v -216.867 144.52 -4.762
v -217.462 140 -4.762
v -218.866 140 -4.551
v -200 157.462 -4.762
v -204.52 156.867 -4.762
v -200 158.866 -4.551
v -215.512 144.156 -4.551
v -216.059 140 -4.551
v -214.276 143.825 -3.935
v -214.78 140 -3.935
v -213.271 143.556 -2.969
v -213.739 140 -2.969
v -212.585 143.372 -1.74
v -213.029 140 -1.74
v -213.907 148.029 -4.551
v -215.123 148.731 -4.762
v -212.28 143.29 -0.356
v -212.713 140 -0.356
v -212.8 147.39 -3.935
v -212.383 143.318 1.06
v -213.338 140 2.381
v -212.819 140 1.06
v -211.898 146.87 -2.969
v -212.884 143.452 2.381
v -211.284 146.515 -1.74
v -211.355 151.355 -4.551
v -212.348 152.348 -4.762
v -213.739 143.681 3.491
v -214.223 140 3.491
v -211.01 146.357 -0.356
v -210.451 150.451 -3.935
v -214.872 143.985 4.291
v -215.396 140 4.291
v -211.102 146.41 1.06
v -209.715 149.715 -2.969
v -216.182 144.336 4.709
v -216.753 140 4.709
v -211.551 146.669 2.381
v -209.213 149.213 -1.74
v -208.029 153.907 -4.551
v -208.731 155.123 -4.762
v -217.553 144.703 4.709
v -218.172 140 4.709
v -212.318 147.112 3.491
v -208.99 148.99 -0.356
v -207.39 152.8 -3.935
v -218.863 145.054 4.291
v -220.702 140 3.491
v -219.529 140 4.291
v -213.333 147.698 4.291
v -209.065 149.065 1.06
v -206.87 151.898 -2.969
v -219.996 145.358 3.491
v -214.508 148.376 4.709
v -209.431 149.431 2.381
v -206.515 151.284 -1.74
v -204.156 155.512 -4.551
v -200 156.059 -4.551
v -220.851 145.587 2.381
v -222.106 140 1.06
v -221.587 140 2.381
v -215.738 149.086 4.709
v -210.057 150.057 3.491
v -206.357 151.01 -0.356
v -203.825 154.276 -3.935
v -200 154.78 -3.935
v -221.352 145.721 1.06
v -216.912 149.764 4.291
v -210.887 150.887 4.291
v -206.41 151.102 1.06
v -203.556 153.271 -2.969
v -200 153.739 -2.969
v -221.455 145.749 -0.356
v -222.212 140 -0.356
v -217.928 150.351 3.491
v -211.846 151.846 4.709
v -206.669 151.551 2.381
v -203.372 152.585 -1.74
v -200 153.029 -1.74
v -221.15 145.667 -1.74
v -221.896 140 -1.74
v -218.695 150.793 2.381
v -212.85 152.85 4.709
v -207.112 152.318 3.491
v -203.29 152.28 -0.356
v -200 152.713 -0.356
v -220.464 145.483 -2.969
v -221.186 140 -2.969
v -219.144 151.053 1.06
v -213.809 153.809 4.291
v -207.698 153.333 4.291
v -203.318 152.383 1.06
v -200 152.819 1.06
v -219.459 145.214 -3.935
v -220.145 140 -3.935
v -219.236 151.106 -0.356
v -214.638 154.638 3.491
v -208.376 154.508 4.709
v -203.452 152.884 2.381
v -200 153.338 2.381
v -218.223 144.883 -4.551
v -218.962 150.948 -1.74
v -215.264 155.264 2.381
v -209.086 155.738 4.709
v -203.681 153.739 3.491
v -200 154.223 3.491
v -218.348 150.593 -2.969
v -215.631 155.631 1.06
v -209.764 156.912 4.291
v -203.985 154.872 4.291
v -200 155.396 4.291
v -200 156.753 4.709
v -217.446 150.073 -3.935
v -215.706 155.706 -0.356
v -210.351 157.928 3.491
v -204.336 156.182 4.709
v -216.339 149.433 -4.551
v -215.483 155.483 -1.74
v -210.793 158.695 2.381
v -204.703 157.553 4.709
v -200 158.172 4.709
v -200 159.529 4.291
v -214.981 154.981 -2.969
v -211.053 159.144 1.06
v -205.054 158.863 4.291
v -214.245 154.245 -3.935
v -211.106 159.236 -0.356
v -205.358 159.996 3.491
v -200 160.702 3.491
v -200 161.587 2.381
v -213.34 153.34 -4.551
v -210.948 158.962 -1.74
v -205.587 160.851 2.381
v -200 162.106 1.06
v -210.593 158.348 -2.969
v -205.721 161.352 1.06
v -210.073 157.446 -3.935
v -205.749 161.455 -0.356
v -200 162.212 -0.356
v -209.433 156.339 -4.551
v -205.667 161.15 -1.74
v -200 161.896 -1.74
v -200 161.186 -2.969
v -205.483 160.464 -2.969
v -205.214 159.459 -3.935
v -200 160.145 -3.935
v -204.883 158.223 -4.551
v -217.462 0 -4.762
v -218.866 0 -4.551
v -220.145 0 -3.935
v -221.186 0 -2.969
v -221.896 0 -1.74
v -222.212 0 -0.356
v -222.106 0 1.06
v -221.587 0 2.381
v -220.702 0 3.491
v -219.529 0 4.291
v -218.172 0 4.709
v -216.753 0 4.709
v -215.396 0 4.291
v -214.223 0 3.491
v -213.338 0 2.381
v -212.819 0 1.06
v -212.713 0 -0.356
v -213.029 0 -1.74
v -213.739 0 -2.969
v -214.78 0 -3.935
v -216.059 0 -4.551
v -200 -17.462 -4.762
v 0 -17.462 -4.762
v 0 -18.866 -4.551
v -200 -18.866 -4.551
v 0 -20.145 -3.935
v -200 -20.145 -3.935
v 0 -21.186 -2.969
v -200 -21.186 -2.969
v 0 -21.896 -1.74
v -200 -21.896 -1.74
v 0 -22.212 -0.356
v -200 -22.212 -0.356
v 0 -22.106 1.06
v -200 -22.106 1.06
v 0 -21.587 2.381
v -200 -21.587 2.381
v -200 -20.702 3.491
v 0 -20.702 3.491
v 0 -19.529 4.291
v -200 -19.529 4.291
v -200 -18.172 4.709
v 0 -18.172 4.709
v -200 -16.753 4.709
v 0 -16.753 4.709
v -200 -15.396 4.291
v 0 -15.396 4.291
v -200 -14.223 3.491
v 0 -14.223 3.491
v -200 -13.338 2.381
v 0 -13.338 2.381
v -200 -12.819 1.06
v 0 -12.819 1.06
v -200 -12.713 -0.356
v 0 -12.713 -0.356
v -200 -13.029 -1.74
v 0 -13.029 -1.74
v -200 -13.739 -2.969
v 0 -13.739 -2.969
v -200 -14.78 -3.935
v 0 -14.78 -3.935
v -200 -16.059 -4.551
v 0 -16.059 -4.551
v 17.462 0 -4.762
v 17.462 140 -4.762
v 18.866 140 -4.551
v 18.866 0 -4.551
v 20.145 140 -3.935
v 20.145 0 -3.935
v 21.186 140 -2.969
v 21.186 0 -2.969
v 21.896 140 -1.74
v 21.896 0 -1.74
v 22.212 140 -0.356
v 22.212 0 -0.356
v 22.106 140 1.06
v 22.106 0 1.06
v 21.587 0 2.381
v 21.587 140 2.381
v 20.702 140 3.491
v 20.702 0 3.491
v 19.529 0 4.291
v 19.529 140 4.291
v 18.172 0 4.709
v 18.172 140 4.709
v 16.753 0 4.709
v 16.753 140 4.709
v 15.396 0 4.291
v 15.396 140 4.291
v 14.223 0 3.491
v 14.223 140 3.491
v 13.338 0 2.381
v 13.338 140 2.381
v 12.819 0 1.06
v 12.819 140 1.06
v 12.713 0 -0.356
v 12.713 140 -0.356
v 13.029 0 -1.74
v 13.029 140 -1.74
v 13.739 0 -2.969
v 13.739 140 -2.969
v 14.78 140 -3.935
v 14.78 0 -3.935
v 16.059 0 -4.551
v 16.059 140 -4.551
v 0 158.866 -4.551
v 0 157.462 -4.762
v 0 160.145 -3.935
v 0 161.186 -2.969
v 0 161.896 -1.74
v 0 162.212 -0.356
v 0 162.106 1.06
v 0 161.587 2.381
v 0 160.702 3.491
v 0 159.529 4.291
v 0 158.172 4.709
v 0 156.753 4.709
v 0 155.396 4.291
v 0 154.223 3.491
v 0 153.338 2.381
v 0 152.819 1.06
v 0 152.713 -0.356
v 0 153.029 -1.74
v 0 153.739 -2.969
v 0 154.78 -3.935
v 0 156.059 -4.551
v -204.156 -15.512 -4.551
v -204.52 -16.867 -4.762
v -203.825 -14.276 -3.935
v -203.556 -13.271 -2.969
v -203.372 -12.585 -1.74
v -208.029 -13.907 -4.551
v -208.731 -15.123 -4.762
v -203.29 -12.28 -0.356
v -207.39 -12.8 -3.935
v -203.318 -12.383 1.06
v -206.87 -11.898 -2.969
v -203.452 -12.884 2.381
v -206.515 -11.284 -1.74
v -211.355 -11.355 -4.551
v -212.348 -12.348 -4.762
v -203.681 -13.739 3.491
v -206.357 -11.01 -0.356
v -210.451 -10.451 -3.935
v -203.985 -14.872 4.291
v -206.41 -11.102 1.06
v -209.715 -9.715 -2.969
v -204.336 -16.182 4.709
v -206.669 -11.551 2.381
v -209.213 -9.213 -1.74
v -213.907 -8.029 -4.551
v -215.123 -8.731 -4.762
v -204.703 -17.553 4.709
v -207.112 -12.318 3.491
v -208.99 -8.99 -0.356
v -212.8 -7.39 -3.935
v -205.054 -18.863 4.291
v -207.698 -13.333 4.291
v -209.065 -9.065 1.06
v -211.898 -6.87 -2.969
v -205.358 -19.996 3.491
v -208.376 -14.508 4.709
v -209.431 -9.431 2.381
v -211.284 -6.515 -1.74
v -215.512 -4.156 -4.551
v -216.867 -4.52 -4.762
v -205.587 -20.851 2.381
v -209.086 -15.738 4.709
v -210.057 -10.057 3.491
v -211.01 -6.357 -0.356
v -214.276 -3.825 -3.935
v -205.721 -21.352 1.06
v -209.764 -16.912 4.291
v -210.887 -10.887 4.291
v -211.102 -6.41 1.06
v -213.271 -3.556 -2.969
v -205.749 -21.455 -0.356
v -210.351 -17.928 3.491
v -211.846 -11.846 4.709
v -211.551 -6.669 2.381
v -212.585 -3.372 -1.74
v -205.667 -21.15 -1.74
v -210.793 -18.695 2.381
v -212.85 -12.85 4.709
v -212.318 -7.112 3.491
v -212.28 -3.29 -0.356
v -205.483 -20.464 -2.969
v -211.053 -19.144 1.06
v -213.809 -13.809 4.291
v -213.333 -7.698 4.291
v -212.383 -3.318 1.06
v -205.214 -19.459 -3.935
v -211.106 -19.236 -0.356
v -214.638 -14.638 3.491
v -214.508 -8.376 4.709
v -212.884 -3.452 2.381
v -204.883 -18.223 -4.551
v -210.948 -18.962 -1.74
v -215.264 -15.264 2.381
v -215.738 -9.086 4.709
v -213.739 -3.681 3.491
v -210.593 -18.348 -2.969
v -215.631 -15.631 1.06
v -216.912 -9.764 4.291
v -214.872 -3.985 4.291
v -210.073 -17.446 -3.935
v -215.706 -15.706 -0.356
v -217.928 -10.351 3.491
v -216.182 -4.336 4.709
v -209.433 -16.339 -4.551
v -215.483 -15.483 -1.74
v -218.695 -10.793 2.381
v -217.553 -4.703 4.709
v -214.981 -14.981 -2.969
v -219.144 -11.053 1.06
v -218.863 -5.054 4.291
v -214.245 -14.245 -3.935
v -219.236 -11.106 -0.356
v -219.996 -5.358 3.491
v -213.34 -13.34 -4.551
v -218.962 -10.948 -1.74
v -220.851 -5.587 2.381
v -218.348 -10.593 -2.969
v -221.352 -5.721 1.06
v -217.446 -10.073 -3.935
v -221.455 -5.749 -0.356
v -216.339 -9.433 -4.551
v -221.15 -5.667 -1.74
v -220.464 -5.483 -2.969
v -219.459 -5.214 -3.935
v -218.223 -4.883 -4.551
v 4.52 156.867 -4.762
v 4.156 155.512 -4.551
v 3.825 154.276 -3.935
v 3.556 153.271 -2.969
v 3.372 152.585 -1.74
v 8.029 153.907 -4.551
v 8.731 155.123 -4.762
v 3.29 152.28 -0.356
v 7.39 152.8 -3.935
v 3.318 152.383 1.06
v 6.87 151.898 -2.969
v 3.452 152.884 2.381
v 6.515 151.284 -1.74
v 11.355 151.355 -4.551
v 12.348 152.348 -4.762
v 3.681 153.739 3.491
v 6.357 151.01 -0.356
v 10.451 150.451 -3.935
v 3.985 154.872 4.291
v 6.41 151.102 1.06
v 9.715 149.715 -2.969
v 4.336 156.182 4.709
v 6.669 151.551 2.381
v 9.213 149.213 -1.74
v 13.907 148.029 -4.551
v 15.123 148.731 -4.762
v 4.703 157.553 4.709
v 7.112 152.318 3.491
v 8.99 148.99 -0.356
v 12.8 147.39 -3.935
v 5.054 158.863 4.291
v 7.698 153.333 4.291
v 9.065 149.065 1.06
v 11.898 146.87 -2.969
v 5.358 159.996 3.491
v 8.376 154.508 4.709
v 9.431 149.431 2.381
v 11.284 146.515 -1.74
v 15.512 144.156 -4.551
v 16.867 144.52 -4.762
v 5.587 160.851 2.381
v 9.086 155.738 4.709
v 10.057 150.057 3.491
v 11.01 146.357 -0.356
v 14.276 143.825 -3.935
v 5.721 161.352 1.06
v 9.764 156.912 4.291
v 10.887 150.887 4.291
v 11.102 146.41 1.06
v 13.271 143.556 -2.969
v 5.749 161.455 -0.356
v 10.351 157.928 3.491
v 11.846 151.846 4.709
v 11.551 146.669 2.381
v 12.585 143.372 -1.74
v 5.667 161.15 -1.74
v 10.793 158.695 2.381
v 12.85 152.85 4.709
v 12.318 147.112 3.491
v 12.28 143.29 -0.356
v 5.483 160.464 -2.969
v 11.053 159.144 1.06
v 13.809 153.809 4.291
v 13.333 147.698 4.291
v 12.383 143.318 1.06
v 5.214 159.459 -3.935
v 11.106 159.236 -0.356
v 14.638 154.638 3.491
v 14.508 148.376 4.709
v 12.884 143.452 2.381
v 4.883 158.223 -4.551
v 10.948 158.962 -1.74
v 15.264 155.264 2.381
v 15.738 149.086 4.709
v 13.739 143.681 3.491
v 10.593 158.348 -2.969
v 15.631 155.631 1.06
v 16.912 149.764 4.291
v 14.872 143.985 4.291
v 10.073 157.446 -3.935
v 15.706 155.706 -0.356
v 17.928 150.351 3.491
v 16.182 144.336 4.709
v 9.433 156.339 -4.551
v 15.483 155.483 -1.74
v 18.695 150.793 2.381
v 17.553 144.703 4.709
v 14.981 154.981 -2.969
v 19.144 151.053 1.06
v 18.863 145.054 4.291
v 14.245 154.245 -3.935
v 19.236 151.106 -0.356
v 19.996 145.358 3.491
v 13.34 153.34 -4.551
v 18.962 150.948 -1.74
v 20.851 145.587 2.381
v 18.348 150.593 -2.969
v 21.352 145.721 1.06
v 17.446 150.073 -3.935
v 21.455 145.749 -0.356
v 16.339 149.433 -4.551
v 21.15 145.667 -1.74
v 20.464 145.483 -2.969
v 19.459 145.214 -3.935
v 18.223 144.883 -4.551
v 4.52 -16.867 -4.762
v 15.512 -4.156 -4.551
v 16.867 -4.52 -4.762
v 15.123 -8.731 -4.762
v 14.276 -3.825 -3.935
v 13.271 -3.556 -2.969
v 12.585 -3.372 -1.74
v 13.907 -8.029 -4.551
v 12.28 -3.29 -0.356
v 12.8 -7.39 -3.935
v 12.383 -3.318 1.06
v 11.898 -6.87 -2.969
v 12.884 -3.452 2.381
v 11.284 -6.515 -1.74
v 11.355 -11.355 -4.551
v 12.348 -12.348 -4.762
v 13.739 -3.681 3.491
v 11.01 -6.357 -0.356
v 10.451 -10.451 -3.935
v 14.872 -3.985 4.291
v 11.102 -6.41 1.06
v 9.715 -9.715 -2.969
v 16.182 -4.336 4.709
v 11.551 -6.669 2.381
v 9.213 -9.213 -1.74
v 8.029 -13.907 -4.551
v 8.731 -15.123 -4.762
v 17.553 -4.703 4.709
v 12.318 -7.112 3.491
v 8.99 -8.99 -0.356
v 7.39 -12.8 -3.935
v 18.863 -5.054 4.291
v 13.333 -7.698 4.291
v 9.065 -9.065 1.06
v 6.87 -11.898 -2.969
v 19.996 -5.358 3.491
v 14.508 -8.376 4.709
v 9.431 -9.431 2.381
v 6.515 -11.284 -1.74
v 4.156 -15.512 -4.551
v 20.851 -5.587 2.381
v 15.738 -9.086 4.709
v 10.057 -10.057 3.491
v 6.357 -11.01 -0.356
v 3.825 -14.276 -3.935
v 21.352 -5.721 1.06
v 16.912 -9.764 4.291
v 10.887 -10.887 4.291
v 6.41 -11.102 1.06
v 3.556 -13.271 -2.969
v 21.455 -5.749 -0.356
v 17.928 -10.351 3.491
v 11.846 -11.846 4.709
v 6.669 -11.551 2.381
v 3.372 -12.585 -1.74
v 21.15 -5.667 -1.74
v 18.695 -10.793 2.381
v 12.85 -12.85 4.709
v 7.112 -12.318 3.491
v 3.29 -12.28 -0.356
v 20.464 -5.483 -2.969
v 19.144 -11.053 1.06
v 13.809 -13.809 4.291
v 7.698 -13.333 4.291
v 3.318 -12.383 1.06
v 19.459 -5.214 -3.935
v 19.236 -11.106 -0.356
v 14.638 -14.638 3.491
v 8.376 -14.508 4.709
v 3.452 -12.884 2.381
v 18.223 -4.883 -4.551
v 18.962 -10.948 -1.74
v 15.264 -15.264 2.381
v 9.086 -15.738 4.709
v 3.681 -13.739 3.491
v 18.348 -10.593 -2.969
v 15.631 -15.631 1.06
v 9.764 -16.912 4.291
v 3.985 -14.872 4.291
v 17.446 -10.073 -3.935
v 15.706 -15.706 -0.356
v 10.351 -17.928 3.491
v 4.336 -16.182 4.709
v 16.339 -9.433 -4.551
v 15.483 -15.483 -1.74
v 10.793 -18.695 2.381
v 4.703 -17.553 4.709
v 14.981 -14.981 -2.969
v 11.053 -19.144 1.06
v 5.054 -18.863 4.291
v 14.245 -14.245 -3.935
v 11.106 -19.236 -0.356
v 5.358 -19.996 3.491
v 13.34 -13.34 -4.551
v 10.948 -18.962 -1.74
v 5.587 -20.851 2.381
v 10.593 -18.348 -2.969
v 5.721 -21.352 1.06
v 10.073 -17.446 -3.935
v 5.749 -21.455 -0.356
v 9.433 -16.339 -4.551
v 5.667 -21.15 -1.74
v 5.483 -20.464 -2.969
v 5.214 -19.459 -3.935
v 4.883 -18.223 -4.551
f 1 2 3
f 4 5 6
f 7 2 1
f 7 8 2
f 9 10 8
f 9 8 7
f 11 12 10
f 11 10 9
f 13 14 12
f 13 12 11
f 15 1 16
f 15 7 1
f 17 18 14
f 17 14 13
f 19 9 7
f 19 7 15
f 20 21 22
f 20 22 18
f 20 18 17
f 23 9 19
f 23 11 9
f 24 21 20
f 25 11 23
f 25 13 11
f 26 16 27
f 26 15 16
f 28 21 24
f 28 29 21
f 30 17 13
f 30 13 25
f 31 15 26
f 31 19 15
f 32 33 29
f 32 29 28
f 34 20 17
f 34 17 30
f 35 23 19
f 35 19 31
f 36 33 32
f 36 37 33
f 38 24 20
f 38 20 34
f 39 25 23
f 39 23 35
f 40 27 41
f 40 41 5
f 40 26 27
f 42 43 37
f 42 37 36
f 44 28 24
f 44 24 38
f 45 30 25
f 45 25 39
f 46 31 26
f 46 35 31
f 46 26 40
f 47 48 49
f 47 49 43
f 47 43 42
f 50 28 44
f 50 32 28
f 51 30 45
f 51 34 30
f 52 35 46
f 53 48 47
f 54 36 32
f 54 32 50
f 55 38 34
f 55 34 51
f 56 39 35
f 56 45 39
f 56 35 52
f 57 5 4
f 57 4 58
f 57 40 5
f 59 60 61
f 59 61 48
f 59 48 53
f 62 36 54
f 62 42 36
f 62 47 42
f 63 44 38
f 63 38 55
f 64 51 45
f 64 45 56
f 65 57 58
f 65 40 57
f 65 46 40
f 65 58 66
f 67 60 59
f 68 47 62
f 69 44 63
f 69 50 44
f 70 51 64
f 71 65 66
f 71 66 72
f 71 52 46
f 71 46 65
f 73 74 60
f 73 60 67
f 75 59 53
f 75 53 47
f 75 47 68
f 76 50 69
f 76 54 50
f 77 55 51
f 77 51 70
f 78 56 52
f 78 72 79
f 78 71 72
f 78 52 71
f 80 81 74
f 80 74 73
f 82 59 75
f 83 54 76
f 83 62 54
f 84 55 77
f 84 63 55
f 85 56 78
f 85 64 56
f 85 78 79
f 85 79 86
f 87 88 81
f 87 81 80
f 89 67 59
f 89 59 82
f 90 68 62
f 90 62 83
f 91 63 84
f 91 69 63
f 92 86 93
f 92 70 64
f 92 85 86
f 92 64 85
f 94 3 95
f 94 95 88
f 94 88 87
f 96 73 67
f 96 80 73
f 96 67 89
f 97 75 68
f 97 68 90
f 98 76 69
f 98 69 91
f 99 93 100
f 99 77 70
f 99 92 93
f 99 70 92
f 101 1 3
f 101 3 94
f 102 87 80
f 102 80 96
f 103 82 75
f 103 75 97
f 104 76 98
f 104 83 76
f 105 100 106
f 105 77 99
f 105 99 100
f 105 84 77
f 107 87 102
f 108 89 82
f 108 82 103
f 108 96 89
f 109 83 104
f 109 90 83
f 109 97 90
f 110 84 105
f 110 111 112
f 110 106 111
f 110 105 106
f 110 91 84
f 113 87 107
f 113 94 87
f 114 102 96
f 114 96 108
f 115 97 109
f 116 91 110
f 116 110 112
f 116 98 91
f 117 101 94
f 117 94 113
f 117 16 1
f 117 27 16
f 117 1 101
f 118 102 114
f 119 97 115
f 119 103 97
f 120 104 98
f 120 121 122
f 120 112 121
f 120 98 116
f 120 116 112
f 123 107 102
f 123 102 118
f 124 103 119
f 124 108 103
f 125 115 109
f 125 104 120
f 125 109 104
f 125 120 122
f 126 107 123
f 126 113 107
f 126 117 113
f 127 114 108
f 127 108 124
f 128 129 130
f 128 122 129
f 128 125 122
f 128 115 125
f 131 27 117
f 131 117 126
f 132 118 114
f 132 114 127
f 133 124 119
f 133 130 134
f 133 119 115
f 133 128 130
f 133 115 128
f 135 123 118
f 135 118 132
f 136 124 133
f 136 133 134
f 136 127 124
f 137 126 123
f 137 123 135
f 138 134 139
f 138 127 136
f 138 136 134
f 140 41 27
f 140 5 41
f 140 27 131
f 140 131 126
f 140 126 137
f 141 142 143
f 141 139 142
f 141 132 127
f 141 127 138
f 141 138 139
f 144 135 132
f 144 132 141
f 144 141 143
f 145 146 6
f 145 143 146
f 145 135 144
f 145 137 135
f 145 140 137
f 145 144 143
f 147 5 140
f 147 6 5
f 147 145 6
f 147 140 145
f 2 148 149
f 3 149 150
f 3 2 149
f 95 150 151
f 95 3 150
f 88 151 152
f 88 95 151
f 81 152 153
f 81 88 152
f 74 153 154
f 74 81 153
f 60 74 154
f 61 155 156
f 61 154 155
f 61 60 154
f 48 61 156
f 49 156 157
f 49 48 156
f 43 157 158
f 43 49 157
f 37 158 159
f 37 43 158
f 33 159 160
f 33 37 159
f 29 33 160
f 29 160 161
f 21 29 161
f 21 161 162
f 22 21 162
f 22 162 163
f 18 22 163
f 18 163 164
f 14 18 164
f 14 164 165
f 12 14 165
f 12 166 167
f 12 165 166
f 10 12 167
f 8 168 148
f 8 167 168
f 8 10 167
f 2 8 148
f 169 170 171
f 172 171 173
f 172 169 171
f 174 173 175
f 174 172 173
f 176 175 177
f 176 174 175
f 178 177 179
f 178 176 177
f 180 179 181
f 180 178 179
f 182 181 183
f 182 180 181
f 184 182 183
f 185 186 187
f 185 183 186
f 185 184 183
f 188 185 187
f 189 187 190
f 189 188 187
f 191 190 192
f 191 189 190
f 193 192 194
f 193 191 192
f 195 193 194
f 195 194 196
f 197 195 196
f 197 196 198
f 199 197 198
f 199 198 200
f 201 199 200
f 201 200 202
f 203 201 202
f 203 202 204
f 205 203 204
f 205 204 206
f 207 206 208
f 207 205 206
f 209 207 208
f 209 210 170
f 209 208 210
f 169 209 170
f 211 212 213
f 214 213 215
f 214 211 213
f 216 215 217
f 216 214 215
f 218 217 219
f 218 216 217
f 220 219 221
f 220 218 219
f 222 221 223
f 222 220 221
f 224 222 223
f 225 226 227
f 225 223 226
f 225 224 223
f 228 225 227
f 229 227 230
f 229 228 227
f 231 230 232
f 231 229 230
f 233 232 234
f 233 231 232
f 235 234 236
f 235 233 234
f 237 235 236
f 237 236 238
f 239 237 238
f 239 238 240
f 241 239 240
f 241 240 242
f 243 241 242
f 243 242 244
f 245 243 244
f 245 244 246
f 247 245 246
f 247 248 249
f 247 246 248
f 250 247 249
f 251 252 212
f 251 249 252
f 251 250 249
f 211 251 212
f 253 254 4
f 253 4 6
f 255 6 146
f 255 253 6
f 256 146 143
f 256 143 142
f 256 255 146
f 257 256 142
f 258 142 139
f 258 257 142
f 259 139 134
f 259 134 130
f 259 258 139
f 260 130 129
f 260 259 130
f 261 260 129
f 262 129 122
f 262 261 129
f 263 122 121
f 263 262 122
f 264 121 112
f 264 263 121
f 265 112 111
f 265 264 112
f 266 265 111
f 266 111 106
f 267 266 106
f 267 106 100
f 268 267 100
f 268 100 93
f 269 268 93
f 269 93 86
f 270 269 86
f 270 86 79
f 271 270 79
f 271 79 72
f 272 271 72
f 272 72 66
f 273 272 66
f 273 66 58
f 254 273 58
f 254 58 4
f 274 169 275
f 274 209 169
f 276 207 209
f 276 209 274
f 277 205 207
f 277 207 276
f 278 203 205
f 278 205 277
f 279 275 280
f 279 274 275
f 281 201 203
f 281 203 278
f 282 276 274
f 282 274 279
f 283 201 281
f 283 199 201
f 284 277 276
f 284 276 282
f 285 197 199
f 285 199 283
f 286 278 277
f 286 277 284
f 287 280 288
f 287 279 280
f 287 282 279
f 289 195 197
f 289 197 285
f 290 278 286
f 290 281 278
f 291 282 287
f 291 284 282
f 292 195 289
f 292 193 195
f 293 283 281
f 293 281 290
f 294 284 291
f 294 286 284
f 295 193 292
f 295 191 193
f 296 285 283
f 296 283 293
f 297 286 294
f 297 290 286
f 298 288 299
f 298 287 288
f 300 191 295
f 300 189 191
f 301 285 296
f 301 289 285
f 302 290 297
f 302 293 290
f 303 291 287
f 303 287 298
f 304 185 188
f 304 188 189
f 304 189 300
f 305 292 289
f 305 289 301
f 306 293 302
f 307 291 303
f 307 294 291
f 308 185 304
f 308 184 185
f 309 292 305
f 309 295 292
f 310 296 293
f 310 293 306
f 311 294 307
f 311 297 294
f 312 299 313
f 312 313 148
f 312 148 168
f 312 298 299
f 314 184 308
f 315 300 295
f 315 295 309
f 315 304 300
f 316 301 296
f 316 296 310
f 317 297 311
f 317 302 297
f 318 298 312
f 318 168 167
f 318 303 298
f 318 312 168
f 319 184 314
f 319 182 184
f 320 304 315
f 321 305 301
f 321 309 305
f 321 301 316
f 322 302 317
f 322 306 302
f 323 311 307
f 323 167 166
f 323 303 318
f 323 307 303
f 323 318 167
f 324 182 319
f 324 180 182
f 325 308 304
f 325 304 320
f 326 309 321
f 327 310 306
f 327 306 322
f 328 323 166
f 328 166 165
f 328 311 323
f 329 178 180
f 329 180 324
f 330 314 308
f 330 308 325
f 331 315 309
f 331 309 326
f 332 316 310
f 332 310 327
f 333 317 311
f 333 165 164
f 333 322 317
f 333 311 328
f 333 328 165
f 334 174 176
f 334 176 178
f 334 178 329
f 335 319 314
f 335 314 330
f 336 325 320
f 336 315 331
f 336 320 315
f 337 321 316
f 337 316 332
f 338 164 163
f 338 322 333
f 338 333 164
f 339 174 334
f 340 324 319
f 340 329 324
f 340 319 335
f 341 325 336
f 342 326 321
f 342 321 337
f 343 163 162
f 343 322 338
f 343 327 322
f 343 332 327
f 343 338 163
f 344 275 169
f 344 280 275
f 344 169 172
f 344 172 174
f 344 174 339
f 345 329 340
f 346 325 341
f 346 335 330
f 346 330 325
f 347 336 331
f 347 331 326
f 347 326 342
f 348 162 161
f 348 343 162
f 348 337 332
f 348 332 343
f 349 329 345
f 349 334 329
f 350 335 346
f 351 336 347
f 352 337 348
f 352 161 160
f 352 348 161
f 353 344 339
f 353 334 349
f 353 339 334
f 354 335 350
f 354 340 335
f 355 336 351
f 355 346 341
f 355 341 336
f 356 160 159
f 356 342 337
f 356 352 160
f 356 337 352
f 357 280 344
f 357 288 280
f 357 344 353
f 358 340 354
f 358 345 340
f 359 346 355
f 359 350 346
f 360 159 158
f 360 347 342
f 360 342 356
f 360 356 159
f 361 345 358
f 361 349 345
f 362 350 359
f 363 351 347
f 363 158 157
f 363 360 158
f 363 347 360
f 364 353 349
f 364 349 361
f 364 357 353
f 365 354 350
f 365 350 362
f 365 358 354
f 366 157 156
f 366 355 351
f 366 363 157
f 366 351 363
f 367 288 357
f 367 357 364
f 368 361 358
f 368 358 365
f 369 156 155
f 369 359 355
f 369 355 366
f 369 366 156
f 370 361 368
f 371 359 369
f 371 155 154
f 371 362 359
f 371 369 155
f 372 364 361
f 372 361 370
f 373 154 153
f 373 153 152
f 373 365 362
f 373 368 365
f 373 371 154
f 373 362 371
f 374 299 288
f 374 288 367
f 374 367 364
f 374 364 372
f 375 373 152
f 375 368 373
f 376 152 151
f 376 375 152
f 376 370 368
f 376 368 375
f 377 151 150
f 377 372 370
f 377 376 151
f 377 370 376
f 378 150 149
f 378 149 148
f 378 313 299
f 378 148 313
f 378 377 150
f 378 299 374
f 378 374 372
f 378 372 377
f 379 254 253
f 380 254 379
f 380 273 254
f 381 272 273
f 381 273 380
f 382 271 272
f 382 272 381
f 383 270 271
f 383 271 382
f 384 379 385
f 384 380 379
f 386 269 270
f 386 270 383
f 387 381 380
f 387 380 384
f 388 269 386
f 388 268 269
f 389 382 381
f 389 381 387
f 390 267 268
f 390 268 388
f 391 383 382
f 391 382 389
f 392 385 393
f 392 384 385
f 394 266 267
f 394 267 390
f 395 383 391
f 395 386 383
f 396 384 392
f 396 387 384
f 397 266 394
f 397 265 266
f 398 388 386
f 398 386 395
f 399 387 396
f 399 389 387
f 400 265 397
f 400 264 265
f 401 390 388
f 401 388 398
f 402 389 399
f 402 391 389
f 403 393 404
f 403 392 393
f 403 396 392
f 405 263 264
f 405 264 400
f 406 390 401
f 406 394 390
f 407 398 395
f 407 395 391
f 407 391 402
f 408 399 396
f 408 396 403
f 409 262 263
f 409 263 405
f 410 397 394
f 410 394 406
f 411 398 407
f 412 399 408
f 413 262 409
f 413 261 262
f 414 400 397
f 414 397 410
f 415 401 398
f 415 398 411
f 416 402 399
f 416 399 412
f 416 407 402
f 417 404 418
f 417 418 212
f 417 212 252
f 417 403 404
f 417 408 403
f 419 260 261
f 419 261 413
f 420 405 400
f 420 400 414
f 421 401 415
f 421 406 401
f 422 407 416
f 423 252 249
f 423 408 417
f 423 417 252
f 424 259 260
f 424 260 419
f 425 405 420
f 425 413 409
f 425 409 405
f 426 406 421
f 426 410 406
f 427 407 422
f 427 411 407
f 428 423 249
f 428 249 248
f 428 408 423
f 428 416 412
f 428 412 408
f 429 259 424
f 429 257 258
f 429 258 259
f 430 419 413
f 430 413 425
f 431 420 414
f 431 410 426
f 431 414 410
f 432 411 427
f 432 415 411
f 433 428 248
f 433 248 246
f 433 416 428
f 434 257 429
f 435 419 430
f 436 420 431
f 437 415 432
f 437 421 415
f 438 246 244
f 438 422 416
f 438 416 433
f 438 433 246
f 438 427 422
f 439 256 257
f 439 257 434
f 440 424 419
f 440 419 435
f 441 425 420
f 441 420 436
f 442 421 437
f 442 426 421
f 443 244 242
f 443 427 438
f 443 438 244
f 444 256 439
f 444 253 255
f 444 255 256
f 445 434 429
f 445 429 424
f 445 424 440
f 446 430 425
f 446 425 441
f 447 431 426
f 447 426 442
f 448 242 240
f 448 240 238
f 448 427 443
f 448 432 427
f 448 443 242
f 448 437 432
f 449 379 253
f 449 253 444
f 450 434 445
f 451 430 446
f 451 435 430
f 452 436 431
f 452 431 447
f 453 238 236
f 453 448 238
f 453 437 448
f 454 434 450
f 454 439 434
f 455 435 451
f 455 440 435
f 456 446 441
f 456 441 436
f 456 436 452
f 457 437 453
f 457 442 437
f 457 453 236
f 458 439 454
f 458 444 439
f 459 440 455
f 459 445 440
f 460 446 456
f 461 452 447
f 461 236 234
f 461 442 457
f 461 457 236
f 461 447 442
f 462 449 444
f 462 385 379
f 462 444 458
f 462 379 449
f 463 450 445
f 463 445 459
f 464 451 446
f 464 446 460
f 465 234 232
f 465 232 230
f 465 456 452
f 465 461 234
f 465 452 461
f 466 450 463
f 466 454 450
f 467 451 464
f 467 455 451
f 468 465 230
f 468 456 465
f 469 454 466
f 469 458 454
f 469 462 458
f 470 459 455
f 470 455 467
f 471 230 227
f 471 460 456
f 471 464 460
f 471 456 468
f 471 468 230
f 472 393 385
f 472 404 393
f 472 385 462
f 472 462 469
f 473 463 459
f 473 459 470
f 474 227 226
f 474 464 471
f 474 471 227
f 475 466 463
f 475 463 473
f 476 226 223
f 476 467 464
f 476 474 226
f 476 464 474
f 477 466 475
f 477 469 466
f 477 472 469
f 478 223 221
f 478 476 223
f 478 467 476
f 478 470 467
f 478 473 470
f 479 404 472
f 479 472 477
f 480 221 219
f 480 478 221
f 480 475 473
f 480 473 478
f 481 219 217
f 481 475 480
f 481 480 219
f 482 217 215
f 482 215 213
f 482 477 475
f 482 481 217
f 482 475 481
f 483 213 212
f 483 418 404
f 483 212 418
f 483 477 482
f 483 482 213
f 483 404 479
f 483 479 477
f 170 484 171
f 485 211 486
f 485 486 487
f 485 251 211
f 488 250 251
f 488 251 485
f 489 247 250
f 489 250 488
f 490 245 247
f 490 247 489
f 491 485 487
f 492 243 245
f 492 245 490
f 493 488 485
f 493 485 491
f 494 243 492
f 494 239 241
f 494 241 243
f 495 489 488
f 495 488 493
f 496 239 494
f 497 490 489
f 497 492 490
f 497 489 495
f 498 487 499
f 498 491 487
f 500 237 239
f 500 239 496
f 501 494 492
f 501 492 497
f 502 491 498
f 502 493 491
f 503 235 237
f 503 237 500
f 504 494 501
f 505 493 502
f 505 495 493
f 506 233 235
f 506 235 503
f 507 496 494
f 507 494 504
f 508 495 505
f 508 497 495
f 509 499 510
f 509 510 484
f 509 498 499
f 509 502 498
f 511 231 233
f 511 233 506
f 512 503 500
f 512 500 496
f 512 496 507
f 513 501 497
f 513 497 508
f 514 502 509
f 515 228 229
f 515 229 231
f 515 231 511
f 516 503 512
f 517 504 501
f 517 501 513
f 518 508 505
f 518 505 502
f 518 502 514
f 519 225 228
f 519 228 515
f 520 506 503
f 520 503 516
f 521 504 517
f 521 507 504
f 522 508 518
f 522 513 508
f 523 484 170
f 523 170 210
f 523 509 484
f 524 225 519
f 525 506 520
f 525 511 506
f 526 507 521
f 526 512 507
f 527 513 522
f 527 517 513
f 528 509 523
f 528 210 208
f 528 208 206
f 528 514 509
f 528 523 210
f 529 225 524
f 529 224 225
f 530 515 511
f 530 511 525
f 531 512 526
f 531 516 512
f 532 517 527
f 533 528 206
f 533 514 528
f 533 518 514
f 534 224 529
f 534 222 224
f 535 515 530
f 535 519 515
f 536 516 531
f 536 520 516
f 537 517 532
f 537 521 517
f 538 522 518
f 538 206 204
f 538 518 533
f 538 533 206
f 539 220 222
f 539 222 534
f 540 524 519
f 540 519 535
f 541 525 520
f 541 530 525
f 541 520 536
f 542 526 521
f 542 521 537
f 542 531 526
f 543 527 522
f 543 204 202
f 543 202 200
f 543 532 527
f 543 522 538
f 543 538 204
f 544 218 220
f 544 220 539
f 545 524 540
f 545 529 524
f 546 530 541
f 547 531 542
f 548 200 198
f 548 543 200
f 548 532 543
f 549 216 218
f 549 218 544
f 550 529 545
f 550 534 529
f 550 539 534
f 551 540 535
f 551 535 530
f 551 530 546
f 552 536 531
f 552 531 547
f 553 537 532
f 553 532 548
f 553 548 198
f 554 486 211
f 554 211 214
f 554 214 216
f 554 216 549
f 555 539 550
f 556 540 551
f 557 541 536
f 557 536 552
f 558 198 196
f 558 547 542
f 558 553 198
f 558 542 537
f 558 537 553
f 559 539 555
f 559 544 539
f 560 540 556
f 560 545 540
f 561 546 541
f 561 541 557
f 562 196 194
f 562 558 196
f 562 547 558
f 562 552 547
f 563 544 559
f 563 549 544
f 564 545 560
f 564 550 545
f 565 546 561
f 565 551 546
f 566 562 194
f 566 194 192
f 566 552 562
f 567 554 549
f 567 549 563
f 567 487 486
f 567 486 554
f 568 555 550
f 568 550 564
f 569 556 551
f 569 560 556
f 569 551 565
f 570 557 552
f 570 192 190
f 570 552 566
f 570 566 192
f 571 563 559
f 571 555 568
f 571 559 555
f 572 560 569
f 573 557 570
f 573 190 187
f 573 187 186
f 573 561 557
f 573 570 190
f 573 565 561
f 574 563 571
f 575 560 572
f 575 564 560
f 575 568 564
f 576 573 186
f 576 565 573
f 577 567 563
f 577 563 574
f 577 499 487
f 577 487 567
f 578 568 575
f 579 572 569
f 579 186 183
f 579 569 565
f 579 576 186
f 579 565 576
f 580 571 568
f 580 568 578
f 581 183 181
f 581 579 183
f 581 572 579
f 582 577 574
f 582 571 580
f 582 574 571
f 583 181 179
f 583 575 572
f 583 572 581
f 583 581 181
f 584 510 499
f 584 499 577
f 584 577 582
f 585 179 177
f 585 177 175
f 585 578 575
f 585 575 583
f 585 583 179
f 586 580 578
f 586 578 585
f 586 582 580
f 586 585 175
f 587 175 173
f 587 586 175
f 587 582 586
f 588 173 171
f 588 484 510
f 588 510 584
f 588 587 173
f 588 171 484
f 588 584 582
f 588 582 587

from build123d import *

# Parameters (mm, degrees)
ESBO_O4_R = 4.7625


with BuildPart() as part:
    # Varredura1: sweep along a path in Esboço1
    with BuildLine(Plane.XY) as varredura1_path:
        Line((-200, 157.4625), (0, 157.4625))
        ThreePointArc((0, 157.4625), (12.347852166, 152.347852166), (17.4625, 140))
        Line((17.4625, 140), (17.4625, 0))
        ThreePointArc((17.4625, 0), (12.347852166, -12.347852166), (0, -17.4625))
        Line((0, -17.4625), (-200, -17.4625))
        ThreePointArc((-200, -17.4625), (-212.347852166, -12.347852166), (-217.4625, 0))
        Line((-217.4625, 0), (-217.4625, 140))
        ThreePointArc((-217.4625, 140), (-212.347852166, 152.347852166), (-200, 157.4625))
    # Esboço4 → Varredura1 (sweep)
    with BuildSketch(Plane(origin=(-200, 0, 0), x_dir=(0, 0, -1), z_dir=(1, 0, 0))):
        with Locations((0, 157.4625)):
            Circle(ESBO_O4_R)
    sweep(path=varredura1_path.line)


solid = part.part
